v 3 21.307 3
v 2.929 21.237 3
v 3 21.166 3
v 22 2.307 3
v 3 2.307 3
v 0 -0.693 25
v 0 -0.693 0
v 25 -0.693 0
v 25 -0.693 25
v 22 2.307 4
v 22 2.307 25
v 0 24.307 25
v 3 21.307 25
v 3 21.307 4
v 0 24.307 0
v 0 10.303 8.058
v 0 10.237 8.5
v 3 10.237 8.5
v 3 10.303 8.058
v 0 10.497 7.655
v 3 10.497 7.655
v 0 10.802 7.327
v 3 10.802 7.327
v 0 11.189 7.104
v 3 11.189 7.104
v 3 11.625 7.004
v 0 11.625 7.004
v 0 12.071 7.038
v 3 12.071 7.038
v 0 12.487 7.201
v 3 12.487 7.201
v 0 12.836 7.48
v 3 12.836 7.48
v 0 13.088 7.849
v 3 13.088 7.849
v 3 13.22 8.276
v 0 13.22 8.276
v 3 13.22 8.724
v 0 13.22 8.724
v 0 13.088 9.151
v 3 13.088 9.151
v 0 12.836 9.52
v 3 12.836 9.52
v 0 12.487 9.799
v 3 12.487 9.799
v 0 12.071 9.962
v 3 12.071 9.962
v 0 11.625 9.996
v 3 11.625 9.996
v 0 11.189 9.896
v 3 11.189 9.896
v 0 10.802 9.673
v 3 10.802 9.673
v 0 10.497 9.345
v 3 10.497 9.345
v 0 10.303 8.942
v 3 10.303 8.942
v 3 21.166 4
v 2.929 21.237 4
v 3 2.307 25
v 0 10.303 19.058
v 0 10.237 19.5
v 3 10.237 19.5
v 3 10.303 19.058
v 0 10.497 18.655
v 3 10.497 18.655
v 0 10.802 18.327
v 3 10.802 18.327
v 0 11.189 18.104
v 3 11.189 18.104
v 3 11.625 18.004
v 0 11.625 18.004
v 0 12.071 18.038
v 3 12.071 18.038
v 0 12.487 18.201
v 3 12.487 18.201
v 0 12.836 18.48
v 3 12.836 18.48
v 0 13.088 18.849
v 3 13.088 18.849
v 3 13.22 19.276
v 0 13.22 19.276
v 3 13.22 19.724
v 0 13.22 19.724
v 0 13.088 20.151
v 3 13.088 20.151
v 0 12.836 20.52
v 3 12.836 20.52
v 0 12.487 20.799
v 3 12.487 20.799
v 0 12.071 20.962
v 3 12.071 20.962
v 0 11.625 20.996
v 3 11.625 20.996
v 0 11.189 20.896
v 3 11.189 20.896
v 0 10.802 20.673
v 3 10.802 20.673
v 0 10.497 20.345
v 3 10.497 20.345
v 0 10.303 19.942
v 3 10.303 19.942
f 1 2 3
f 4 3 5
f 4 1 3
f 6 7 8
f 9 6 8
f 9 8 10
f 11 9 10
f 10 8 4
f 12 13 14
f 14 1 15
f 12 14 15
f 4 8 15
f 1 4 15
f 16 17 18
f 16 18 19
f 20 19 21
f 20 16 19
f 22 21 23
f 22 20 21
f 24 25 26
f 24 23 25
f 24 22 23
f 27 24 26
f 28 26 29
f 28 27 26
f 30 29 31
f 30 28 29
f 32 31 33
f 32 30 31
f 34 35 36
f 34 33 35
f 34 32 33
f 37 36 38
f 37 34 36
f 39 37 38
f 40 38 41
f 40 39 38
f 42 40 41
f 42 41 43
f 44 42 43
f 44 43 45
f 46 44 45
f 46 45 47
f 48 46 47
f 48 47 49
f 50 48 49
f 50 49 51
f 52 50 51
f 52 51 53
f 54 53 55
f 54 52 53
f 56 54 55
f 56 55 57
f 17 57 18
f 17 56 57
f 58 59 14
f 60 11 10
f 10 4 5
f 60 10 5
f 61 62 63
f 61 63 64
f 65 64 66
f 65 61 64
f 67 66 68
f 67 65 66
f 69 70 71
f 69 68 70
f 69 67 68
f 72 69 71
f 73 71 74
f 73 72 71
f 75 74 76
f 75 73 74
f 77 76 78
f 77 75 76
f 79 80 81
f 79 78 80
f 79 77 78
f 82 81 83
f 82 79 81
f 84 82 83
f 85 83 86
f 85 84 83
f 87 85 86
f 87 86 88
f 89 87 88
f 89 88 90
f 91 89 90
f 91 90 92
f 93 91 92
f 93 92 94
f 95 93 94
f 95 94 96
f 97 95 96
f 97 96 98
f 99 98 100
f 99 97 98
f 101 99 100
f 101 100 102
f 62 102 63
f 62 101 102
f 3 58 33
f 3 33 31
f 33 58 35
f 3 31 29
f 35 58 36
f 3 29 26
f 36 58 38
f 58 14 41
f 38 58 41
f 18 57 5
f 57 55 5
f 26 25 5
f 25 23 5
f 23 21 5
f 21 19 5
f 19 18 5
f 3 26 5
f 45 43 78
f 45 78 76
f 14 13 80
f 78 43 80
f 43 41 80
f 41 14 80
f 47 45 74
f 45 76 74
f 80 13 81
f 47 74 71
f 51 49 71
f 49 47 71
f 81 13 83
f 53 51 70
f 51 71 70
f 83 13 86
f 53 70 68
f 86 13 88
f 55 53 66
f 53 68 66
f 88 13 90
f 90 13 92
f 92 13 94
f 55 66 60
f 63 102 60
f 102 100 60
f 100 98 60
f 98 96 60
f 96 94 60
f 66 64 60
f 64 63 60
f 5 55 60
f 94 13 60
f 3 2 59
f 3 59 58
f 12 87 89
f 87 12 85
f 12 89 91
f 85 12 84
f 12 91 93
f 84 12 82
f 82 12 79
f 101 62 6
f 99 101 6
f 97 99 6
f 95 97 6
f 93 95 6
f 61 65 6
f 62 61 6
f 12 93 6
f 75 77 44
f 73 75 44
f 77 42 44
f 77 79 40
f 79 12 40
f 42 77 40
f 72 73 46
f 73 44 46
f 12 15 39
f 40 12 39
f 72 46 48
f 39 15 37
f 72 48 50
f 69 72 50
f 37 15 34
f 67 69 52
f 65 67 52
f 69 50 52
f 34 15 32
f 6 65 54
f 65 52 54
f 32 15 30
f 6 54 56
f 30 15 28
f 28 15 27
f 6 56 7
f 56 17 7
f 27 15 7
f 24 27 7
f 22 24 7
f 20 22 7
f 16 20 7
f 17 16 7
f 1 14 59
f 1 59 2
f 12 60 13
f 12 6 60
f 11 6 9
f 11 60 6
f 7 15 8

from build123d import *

# Parameters (mm, degrees)
BOSS_EXTRUDE2_DEPTH     = 25
CUT_EXTRUDE1_DEPTH      = 21
SKETCH3_W               = 26.870057685
SKETCH3_H               = 1
CUT_EXTRUDE3_DEPTH      = 0.1
CUT_EXTRUDE4_DEPTH      = 1
BOSS_EXTRUDE3_DEPTH     = 1
CUT_EXTRUDE5_DEPTH      = 15
CUT_EXTRUDE5_DEPTH_BACK = 18
SKETCH8_R               = 1.5


with BuildPart() as part:
    # Sketch1 → Boss-Extrude2 (new body)
    with BuildSketch(Plane.XY):
        Polygon((0, 24.307463671), (0, -0.692536329), (25, -0.692536329), align=None)
    extrude(amount=BOSS_EXTRUDE2_DEPTH)

    # Sketch2 → Cut-Extrude1 (cut)
    with BuildSketch(Plane.XY.offset(25)):
        Polygon((3, 21.307463671), (3, 2.307463671), (22, 2.307463671), align=None)
    extrude(amount=-CUT_EXTRUDE1_DEPTH, mode=Mode.SUBTRACT)

    # Sketch3 → Cut-Extrude3 (cut)
    with BuildSketch(Plane(origin=(12.153731836, 12.153731836, 0), x_dir=(0.7071067811865475, -0.7071067811865477, 0), z_dir=(0.7071067811865477, 0.7071067811865475, 0))):
        with Locations((0.489697135, -3.5)):
            Rectangle(SKETCH3_W, SKETCH3_H)
    extrude(amount=-CUT_EXTRUDE3_DEPTH, mode=Mode.SUBTRACT)

    # Sketch4 → Cut-Extrude4 (cut)
    with BuildSketch(Plane.XY.offset(4)):
        Polygon((3, 21.307463671), (3, 2.307463671), (22, 2.307463671), align=None)
    extrude(amount=-CUT_EXTRUDE4_DEPTH, mode=Mode.SUBTRACT)

    # Sketch5 → Boss-Extrude3 (add)
    with BuildSketch(Plane.XY.offset(3)):
        Polygon((22, 2.307463671), (21.858578644, 2.307463671), (21.929289322, 2.236752993), align=None)
    extrude(amount=BOSS_EXTRUDE3_DEPTH)

    # Sketch8 → Cut-Extrude5 (cut, two sides: drawn at the far end of the back side and taken through both)
    with BuildSketch(Plane(origin=(3, 0, 0), x_dir=(0, 0, -1), z_dir=(1, 0, 0)).offset(-CUT_EXTRUDE5_DEPTH_BACK)):
        with Locations(Location((-8.5, 11.736752993, 0), (0, 0, 270))):
            Circle(SKETCH8_R)
        with Locations(Location((-19.5, 11.736752993, 0), (0, 0, 270))):
            Circle(SKETCH8_R)
    extrude(amount=CUT_EXTRUDE5_DEPTH + CUT_EXTRUDE5_DEPTH_BACK, mode=Mode.SUBTRACT)


solid = part.part
